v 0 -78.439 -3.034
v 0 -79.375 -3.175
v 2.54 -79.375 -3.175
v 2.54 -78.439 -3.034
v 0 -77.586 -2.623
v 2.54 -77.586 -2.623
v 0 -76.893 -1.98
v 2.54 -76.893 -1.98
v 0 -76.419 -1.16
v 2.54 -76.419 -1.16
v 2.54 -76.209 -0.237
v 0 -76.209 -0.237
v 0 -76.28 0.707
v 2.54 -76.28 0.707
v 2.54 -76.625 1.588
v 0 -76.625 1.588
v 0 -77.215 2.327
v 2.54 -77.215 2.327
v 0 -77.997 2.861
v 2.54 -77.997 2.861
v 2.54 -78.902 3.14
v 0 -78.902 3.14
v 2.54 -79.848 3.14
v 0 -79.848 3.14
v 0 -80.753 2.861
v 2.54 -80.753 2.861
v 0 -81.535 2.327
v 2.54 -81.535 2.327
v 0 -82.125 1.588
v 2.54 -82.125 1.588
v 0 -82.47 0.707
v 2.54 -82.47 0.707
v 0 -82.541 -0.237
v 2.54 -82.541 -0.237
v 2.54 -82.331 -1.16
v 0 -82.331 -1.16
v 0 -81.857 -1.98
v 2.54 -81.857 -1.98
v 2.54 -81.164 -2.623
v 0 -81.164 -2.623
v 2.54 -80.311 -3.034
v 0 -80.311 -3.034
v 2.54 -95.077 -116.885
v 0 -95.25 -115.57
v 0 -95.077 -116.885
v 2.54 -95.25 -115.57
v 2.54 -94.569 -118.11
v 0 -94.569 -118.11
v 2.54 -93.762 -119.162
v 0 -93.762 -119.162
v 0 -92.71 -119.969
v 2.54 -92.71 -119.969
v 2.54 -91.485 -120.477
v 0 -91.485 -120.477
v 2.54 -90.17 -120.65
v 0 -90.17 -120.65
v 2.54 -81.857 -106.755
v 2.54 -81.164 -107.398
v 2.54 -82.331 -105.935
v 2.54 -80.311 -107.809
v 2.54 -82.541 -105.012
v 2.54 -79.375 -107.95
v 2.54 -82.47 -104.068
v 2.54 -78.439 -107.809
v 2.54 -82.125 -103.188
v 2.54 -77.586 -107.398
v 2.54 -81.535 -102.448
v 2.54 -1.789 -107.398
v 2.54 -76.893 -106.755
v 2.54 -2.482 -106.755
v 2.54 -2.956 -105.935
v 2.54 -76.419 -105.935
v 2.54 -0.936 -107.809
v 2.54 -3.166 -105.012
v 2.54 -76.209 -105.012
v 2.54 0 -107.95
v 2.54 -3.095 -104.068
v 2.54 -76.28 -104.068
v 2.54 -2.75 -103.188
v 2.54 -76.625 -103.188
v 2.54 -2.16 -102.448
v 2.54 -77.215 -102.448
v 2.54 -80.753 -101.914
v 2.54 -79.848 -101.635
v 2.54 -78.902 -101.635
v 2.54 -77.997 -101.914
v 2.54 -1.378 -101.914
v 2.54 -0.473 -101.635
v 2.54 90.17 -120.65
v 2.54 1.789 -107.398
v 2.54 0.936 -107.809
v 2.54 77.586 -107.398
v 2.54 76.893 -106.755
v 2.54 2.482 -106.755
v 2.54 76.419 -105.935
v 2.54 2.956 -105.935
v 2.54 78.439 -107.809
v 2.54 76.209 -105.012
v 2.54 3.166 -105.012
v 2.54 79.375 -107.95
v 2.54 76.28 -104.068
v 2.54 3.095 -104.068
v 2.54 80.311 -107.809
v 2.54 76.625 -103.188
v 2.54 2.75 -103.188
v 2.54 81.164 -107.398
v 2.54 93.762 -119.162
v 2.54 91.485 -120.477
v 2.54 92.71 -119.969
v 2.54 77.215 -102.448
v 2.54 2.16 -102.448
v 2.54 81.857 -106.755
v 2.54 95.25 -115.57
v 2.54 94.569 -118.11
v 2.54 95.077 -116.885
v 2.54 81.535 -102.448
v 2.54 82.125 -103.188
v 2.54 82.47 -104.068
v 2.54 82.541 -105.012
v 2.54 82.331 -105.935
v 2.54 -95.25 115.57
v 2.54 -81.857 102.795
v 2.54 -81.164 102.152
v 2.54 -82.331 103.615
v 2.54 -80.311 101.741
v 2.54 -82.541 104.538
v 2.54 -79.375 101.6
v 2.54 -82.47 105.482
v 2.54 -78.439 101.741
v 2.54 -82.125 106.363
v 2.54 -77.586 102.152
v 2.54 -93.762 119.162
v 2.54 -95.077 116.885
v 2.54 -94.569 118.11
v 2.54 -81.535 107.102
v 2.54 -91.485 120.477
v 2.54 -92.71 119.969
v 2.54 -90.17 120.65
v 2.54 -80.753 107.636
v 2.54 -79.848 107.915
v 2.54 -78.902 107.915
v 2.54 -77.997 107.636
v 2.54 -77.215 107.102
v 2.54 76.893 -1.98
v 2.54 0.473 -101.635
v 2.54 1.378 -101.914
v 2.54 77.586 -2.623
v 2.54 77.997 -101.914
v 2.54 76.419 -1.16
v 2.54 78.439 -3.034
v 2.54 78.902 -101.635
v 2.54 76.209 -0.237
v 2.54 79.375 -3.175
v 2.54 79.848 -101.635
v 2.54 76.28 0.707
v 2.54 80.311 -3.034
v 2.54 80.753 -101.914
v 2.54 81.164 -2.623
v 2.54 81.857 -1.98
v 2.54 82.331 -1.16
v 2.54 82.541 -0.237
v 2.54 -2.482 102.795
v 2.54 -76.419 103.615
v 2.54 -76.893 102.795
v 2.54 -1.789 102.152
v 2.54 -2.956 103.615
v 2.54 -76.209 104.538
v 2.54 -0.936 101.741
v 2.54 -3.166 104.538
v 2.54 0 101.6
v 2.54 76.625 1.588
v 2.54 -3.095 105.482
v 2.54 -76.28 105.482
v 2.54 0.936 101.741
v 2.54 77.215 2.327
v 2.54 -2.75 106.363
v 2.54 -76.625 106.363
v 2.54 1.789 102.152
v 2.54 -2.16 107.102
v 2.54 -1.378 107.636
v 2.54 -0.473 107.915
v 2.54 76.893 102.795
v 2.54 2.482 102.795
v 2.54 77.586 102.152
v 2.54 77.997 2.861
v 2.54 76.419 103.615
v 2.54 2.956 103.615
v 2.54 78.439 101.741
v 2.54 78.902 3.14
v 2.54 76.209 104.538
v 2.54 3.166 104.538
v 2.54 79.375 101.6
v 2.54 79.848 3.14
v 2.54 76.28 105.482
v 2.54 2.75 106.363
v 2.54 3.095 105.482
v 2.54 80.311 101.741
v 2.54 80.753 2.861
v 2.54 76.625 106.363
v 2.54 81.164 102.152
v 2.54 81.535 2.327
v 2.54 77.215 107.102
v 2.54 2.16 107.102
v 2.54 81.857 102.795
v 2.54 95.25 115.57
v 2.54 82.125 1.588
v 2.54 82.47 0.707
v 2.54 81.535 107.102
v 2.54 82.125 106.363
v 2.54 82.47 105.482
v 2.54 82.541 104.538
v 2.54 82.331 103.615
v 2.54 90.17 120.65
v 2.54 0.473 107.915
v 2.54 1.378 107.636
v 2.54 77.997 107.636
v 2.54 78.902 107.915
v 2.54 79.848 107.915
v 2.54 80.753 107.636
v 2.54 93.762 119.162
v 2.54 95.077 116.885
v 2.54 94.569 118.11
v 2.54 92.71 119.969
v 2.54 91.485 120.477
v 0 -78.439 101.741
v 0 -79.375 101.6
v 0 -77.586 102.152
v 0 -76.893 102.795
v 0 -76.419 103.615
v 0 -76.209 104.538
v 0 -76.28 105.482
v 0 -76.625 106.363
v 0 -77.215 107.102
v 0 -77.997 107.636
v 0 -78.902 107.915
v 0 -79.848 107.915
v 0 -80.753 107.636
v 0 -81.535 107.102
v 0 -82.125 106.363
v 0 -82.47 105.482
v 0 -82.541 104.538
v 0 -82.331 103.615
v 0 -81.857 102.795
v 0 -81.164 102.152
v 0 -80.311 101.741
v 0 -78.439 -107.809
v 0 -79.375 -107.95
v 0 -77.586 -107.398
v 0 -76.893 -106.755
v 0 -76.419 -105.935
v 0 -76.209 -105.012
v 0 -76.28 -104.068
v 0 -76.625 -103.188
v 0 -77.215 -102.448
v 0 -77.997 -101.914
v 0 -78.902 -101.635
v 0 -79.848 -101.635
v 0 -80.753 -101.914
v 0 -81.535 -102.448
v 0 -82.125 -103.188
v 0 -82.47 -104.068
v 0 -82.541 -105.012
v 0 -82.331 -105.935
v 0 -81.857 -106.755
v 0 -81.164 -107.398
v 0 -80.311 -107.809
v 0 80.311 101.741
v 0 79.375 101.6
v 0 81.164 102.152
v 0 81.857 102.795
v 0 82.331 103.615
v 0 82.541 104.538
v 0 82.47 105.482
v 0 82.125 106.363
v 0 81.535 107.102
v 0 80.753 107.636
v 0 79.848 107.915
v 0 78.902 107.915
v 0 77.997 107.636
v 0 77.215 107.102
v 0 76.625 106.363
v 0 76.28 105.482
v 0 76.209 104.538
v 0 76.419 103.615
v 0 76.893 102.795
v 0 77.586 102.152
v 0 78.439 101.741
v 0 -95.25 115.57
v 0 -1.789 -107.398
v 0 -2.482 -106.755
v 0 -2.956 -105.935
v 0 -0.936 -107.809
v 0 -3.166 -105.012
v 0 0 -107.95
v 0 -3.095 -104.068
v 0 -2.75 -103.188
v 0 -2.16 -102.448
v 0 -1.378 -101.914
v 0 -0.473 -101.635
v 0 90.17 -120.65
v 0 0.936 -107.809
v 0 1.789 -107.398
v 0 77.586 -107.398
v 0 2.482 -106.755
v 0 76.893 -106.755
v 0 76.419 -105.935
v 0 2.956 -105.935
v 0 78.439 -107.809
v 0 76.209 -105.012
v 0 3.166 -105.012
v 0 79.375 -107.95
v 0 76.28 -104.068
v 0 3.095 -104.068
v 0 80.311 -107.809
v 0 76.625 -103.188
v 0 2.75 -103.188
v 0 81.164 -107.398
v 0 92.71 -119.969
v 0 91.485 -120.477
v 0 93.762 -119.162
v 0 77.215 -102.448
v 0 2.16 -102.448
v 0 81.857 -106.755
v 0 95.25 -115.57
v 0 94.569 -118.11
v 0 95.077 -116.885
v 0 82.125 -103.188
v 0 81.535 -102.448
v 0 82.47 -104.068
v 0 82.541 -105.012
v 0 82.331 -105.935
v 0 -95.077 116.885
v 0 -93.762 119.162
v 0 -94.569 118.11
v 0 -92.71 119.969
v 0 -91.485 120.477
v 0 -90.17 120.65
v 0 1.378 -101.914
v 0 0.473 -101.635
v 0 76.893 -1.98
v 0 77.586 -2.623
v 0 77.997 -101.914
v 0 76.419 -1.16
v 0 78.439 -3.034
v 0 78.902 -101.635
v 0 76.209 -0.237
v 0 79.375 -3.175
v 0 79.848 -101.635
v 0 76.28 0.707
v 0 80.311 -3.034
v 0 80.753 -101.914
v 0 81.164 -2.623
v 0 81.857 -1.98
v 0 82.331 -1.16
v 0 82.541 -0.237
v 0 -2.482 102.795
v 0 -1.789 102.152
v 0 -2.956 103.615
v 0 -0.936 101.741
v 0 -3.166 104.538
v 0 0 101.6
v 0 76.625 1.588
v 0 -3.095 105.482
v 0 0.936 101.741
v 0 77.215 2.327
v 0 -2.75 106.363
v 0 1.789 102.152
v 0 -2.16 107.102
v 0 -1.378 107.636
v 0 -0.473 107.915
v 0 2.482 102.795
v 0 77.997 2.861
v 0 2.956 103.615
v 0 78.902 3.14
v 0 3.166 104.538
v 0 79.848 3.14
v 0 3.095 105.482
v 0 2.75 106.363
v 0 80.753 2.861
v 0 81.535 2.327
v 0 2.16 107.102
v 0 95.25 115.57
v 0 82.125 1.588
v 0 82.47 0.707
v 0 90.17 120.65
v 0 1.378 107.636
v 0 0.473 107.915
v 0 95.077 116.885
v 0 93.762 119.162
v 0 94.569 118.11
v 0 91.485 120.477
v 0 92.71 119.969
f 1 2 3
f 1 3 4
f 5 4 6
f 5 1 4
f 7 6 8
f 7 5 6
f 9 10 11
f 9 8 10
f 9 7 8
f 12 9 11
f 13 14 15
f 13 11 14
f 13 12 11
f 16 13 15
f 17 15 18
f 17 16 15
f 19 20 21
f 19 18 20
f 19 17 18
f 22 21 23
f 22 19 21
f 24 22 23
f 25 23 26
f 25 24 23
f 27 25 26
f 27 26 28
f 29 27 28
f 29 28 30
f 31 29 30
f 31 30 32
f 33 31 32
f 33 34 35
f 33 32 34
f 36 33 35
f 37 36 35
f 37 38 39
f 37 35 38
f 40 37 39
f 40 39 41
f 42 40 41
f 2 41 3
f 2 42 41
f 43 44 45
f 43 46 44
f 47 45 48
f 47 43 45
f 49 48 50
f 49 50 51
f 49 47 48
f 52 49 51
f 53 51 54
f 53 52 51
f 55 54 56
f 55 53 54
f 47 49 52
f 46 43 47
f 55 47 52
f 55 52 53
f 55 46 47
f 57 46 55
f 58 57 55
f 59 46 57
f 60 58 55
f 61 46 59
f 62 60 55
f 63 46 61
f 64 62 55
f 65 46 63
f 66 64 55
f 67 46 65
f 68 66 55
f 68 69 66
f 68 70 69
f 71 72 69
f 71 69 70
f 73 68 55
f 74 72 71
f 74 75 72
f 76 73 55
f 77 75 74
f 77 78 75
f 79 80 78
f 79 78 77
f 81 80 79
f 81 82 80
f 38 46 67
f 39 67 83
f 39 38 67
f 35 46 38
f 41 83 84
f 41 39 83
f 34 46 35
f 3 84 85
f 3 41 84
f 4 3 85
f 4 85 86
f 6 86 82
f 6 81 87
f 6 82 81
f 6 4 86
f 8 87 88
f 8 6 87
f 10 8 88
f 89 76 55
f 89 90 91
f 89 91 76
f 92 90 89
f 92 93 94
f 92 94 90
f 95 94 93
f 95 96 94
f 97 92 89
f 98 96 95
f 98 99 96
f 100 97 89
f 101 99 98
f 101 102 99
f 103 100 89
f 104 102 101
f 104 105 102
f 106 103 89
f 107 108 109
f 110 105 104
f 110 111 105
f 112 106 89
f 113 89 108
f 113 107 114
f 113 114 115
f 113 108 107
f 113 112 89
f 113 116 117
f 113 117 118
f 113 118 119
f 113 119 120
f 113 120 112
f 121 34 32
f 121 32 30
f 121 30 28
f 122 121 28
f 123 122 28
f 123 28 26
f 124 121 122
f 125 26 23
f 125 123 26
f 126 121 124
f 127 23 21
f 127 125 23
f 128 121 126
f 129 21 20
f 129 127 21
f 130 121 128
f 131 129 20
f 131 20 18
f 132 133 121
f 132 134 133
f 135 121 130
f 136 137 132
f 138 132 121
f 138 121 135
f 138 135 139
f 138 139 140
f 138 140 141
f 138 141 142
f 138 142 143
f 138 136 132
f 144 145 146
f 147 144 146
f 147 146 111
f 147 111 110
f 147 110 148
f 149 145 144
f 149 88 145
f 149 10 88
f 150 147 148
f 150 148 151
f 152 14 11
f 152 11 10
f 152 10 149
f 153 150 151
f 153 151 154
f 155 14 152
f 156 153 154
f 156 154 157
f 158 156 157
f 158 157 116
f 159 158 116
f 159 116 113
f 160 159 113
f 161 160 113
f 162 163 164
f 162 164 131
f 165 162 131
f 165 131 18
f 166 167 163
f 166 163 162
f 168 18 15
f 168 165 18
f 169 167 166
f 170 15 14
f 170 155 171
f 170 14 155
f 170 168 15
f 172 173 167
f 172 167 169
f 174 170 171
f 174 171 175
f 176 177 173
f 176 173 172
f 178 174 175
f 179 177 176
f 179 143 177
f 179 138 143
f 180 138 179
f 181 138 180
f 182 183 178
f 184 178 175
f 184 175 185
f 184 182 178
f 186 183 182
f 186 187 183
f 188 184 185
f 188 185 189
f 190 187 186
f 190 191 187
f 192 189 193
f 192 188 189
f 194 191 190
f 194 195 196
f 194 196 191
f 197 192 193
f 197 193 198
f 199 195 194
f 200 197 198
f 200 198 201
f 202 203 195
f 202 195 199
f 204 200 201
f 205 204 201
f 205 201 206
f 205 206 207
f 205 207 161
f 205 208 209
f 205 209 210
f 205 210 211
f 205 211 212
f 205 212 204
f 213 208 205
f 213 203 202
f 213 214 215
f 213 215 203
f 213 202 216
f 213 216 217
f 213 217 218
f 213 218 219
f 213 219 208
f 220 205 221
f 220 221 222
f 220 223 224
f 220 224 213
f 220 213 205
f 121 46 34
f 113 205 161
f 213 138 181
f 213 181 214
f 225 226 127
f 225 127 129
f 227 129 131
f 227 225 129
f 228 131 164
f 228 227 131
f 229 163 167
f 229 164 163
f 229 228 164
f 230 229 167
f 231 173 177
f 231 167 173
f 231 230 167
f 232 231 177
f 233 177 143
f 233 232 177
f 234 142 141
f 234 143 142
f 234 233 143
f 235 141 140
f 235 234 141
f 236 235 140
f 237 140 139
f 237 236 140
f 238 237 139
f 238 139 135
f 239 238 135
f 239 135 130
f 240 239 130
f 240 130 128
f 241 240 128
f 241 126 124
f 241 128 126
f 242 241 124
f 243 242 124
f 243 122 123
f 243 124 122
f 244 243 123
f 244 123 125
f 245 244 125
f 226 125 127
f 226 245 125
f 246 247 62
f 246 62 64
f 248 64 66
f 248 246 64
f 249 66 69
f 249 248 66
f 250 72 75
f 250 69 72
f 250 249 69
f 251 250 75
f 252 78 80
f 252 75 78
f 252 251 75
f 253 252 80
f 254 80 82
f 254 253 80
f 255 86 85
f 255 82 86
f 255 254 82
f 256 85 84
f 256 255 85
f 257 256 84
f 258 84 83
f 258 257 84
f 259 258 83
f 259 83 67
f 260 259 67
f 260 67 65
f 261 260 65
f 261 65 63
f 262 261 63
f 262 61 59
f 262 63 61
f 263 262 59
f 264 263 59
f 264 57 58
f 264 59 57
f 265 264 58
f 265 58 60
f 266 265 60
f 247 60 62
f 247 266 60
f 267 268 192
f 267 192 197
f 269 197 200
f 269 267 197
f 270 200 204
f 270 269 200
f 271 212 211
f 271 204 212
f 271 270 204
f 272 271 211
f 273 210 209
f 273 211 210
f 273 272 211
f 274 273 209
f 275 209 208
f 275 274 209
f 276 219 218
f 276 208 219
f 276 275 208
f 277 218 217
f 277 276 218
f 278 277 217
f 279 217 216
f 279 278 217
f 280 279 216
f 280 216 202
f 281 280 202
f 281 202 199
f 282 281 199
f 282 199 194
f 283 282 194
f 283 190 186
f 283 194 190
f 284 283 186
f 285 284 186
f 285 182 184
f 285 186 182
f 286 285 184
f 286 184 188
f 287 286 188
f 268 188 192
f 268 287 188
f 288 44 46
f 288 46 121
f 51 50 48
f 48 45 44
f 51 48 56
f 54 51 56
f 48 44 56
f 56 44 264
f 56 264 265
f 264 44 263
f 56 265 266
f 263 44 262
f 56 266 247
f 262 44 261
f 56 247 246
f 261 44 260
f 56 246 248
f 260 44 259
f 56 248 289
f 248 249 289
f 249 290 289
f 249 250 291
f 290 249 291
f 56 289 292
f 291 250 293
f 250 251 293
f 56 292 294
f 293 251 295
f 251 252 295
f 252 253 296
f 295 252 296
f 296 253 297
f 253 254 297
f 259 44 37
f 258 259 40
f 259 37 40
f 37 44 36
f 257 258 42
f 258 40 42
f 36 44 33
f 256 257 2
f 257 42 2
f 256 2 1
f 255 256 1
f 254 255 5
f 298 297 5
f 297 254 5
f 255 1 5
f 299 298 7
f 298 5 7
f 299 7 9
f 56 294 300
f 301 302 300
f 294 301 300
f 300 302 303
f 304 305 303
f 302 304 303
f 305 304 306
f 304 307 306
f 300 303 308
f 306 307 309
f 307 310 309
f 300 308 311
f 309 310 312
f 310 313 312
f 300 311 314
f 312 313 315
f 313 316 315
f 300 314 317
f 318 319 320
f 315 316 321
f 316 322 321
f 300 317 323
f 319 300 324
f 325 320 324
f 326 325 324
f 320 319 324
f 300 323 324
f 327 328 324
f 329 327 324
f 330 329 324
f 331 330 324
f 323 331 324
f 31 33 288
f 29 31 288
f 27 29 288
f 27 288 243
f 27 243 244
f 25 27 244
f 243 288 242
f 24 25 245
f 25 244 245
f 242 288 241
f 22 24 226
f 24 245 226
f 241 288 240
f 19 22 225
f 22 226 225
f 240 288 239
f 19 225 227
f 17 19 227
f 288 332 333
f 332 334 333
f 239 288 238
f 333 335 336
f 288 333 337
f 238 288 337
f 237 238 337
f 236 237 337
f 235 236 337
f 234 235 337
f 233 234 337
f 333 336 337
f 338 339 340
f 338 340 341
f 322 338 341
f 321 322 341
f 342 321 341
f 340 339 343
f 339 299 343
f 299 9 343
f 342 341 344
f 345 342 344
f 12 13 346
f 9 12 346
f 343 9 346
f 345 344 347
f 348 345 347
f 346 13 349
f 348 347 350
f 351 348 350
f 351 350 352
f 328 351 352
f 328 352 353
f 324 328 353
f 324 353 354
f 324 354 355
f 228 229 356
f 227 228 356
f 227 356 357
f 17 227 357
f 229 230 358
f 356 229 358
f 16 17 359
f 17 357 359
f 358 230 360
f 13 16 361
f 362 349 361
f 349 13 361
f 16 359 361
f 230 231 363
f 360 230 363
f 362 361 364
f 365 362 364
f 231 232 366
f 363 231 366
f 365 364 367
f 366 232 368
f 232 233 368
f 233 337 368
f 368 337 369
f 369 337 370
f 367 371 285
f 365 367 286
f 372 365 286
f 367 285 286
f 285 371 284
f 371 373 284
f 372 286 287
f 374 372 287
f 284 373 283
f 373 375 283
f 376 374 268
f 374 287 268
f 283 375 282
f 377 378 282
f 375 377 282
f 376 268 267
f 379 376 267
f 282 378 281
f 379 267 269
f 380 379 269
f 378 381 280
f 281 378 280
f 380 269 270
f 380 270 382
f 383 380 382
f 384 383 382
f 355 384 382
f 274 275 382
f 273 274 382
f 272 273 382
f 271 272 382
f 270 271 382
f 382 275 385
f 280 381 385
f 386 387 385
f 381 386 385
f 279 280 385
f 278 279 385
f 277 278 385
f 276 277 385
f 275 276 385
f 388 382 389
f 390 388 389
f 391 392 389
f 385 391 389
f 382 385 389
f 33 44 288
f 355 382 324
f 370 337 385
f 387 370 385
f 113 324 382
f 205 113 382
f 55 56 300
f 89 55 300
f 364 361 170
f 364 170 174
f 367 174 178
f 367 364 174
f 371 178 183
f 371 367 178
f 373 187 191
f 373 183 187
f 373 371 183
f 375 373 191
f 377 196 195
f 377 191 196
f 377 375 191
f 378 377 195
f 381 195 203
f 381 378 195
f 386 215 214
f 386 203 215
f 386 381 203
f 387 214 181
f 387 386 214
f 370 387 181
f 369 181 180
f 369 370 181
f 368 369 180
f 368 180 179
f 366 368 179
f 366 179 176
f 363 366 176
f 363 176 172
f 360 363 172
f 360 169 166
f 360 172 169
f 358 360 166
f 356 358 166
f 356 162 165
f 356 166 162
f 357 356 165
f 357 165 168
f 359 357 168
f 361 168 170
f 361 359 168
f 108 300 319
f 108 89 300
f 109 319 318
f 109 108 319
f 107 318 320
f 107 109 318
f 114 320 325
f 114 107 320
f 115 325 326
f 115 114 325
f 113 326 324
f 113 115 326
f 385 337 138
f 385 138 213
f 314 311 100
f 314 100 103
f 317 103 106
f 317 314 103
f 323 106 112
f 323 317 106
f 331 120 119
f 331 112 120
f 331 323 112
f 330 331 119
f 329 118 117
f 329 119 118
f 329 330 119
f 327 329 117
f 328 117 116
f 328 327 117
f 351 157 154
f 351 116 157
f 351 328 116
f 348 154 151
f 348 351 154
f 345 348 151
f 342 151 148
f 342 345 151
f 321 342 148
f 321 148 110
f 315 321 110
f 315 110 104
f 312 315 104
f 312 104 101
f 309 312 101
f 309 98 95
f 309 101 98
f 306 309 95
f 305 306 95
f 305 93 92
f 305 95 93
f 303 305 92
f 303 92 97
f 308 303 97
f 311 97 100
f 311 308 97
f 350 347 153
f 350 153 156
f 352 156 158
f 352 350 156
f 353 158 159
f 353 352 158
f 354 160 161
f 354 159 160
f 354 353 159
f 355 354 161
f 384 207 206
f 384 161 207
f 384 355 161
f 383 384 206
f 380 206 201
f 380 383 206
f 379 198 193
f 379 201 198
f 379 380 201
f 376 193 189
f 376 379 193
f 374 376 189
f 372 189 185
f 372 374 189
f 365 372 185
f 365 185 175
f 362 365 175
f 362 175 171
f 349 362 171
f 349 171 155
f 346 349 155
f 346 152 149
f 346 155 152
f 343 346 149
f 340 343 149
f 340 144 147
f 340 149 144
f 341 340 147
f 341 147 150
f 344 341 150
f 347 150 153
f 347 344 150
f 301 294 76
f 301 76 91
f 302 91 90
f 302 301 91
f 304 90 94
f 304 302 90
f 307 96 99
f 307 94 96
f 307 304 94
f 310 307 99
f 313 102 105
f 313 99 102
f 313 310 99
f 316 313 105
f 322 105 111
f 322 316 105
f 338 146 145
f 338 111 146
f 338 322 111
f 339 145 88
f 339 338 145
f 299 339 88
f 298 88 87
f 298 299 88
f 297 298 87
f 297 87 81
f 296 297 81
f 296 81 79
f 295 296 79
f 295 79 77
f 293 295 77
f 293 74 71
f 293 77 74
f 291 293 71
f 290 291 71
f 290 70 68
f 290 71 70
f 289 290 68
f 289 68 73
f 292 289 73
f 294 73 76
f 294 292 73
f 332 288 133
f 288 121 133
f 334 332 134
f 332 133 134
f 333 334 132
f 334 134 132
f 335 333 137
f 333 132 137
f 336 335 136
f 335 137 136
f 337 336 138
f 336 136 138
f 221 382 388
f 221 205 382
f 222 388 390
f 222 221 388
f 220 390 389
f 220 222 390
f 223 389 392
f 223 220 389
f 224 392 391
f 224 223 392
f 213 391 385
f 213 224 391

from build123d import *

# Parameters (mm, degrees)
SKETCH1_W               = 190.5
SKETCH1_H               = 241.3
BOSS_EXTRUDE1_DEPTH     = 2.54
FILLET1_R               = 5.08
CUT_EXTRUDE1_DEPTH      = 154.738208003
CUT_EXTRUDE1_DEPTH_BACK = 154.738208003
SKETCH2_R               = 3.175


with BuildPart() as part:
    # Sketch1 → Boss-Extrude1 (new body)
    with BuildSketch(Plane.YZ):
        Rectangle(SKETCH1_W, SKETCH1_H)
    extrude(amount=BOSS_EXTRUDE1_DEPTH)

    # Fillet1
    fillet1_edges = [part.edges().sort_by_distance(p)[0] for p in [
        (1.27, 95.25, -120.65),
        (1.27, -95.25, -120.65),
        (1.27, -95.25, 120.65),
        (1.27, 95.25, 120.65),
    ]]
    fillet(fillet1_edges, radius=FILLET1_R)

    # Sketch2 → Cut-Extrude1 (cut, two sides: drawn at the far end of the back side and taken through both)
    with BuildSketch(Plane(origin=(2.54, 0, 0), x_dir=(0, 0, -1), z_dir=(1, 0, 0)).offset(-CUT_EXTRUDE1_DEPTH_BACK)):
        with Locations((-574.675, 0)):
            Circle(SKETCH2_R)
        with Locations((-725.4875, 79.375)):
            Circle(SKETCH2_R)
        with Locations((-831.85, 79.375)):
            Circle(SKETCH2_R)
        with Locations((-938.2125, 79.375)):
            Circle(SKETCH2_R)
        with Locations((-1044.575, 79.375)):
            Circle(SKETCH2_R)
        with Locations((-1044.575, -79.375)):
            Circle(SKETCH2_R)
        with Locations((-1044.575, 0)):
            Circle(SKETCH2_R)
        with Locations((-574.675, 79.375)):
            Circle(SKETCH2_R)
        with Locations((-468.3125, 79.375)):
            Circle(SKETCH2_R)
        with Locations((-574.675, -79.375)):
            Circle(SKETCH2_R)
        with Locations((-725.4875, -79.375)):
            Circle(SKETCH2_R)
        with Locations((-619.125, -79.375)):
            Circle(SKETCH2_R)
        with Locations((-619.125, 0)):
            Circle(SKETCH2_R)
        with Locations((-619.125, 79.375)):
            Circle(SKETCH2_R)
        with Locations((-255.5875, 79.375)):
            Circle(SKETCH2_R)
        with Locations((-361.95, 79.375)):
            Circle(SKETCH2_R)
        with Locations((-938.2125, -79.375)):
            Circle(SKETCH2_R)
        with Locations((-831.85, -79.375)):
            Circle(SKETCH2_R)
        with Locations((-149.225, -79.375)):
            Circle(SKETCH2_R)
        with Locations((-255.5875, -79.375)):
            Circle(SKETCH2_R)
        with Locations((-149.225, 79.375)):
            Circle(SKETCH2_R)
        with Locations((-361.95, -79.375)):
            Circle(SKETCH2_R)
        with Locations((-149.225, 0)):
            Circle(SKETCH2_R)
        with Locations((-468.3125, -79.375)):
            Circle(SKETCH2_R)
        with Locations((0, 79.375)):
            Circle(SKETCH2_R)
        with Locations((0, -79.375)):
            Circle(SKETCH2_R)
        with Locations((-104.775, -79.375)):
            Circle(SKETCH2_R)
        with Locations((-104.775, 79.375)):
            Circle(SKETCH2_R)
        with Locations((104.775, 0)):
            Circle(SKETCH2_R)
        with Locations((-104.775, 0)):
            Circle(SKETCH2_R)
        with Locations((104.775, -79.375)):
            Circle(SKETCH2_R)
        with Locations((104.775, 79.375)):
            Circle(SKETCH2_R)
    extrude(amount=CUT_EXTRUDE1_DEPTH + CUT_EXTRUDE1_DEPTH_BACK, mode=Mode.SUBTRACT)


solid = part.part
